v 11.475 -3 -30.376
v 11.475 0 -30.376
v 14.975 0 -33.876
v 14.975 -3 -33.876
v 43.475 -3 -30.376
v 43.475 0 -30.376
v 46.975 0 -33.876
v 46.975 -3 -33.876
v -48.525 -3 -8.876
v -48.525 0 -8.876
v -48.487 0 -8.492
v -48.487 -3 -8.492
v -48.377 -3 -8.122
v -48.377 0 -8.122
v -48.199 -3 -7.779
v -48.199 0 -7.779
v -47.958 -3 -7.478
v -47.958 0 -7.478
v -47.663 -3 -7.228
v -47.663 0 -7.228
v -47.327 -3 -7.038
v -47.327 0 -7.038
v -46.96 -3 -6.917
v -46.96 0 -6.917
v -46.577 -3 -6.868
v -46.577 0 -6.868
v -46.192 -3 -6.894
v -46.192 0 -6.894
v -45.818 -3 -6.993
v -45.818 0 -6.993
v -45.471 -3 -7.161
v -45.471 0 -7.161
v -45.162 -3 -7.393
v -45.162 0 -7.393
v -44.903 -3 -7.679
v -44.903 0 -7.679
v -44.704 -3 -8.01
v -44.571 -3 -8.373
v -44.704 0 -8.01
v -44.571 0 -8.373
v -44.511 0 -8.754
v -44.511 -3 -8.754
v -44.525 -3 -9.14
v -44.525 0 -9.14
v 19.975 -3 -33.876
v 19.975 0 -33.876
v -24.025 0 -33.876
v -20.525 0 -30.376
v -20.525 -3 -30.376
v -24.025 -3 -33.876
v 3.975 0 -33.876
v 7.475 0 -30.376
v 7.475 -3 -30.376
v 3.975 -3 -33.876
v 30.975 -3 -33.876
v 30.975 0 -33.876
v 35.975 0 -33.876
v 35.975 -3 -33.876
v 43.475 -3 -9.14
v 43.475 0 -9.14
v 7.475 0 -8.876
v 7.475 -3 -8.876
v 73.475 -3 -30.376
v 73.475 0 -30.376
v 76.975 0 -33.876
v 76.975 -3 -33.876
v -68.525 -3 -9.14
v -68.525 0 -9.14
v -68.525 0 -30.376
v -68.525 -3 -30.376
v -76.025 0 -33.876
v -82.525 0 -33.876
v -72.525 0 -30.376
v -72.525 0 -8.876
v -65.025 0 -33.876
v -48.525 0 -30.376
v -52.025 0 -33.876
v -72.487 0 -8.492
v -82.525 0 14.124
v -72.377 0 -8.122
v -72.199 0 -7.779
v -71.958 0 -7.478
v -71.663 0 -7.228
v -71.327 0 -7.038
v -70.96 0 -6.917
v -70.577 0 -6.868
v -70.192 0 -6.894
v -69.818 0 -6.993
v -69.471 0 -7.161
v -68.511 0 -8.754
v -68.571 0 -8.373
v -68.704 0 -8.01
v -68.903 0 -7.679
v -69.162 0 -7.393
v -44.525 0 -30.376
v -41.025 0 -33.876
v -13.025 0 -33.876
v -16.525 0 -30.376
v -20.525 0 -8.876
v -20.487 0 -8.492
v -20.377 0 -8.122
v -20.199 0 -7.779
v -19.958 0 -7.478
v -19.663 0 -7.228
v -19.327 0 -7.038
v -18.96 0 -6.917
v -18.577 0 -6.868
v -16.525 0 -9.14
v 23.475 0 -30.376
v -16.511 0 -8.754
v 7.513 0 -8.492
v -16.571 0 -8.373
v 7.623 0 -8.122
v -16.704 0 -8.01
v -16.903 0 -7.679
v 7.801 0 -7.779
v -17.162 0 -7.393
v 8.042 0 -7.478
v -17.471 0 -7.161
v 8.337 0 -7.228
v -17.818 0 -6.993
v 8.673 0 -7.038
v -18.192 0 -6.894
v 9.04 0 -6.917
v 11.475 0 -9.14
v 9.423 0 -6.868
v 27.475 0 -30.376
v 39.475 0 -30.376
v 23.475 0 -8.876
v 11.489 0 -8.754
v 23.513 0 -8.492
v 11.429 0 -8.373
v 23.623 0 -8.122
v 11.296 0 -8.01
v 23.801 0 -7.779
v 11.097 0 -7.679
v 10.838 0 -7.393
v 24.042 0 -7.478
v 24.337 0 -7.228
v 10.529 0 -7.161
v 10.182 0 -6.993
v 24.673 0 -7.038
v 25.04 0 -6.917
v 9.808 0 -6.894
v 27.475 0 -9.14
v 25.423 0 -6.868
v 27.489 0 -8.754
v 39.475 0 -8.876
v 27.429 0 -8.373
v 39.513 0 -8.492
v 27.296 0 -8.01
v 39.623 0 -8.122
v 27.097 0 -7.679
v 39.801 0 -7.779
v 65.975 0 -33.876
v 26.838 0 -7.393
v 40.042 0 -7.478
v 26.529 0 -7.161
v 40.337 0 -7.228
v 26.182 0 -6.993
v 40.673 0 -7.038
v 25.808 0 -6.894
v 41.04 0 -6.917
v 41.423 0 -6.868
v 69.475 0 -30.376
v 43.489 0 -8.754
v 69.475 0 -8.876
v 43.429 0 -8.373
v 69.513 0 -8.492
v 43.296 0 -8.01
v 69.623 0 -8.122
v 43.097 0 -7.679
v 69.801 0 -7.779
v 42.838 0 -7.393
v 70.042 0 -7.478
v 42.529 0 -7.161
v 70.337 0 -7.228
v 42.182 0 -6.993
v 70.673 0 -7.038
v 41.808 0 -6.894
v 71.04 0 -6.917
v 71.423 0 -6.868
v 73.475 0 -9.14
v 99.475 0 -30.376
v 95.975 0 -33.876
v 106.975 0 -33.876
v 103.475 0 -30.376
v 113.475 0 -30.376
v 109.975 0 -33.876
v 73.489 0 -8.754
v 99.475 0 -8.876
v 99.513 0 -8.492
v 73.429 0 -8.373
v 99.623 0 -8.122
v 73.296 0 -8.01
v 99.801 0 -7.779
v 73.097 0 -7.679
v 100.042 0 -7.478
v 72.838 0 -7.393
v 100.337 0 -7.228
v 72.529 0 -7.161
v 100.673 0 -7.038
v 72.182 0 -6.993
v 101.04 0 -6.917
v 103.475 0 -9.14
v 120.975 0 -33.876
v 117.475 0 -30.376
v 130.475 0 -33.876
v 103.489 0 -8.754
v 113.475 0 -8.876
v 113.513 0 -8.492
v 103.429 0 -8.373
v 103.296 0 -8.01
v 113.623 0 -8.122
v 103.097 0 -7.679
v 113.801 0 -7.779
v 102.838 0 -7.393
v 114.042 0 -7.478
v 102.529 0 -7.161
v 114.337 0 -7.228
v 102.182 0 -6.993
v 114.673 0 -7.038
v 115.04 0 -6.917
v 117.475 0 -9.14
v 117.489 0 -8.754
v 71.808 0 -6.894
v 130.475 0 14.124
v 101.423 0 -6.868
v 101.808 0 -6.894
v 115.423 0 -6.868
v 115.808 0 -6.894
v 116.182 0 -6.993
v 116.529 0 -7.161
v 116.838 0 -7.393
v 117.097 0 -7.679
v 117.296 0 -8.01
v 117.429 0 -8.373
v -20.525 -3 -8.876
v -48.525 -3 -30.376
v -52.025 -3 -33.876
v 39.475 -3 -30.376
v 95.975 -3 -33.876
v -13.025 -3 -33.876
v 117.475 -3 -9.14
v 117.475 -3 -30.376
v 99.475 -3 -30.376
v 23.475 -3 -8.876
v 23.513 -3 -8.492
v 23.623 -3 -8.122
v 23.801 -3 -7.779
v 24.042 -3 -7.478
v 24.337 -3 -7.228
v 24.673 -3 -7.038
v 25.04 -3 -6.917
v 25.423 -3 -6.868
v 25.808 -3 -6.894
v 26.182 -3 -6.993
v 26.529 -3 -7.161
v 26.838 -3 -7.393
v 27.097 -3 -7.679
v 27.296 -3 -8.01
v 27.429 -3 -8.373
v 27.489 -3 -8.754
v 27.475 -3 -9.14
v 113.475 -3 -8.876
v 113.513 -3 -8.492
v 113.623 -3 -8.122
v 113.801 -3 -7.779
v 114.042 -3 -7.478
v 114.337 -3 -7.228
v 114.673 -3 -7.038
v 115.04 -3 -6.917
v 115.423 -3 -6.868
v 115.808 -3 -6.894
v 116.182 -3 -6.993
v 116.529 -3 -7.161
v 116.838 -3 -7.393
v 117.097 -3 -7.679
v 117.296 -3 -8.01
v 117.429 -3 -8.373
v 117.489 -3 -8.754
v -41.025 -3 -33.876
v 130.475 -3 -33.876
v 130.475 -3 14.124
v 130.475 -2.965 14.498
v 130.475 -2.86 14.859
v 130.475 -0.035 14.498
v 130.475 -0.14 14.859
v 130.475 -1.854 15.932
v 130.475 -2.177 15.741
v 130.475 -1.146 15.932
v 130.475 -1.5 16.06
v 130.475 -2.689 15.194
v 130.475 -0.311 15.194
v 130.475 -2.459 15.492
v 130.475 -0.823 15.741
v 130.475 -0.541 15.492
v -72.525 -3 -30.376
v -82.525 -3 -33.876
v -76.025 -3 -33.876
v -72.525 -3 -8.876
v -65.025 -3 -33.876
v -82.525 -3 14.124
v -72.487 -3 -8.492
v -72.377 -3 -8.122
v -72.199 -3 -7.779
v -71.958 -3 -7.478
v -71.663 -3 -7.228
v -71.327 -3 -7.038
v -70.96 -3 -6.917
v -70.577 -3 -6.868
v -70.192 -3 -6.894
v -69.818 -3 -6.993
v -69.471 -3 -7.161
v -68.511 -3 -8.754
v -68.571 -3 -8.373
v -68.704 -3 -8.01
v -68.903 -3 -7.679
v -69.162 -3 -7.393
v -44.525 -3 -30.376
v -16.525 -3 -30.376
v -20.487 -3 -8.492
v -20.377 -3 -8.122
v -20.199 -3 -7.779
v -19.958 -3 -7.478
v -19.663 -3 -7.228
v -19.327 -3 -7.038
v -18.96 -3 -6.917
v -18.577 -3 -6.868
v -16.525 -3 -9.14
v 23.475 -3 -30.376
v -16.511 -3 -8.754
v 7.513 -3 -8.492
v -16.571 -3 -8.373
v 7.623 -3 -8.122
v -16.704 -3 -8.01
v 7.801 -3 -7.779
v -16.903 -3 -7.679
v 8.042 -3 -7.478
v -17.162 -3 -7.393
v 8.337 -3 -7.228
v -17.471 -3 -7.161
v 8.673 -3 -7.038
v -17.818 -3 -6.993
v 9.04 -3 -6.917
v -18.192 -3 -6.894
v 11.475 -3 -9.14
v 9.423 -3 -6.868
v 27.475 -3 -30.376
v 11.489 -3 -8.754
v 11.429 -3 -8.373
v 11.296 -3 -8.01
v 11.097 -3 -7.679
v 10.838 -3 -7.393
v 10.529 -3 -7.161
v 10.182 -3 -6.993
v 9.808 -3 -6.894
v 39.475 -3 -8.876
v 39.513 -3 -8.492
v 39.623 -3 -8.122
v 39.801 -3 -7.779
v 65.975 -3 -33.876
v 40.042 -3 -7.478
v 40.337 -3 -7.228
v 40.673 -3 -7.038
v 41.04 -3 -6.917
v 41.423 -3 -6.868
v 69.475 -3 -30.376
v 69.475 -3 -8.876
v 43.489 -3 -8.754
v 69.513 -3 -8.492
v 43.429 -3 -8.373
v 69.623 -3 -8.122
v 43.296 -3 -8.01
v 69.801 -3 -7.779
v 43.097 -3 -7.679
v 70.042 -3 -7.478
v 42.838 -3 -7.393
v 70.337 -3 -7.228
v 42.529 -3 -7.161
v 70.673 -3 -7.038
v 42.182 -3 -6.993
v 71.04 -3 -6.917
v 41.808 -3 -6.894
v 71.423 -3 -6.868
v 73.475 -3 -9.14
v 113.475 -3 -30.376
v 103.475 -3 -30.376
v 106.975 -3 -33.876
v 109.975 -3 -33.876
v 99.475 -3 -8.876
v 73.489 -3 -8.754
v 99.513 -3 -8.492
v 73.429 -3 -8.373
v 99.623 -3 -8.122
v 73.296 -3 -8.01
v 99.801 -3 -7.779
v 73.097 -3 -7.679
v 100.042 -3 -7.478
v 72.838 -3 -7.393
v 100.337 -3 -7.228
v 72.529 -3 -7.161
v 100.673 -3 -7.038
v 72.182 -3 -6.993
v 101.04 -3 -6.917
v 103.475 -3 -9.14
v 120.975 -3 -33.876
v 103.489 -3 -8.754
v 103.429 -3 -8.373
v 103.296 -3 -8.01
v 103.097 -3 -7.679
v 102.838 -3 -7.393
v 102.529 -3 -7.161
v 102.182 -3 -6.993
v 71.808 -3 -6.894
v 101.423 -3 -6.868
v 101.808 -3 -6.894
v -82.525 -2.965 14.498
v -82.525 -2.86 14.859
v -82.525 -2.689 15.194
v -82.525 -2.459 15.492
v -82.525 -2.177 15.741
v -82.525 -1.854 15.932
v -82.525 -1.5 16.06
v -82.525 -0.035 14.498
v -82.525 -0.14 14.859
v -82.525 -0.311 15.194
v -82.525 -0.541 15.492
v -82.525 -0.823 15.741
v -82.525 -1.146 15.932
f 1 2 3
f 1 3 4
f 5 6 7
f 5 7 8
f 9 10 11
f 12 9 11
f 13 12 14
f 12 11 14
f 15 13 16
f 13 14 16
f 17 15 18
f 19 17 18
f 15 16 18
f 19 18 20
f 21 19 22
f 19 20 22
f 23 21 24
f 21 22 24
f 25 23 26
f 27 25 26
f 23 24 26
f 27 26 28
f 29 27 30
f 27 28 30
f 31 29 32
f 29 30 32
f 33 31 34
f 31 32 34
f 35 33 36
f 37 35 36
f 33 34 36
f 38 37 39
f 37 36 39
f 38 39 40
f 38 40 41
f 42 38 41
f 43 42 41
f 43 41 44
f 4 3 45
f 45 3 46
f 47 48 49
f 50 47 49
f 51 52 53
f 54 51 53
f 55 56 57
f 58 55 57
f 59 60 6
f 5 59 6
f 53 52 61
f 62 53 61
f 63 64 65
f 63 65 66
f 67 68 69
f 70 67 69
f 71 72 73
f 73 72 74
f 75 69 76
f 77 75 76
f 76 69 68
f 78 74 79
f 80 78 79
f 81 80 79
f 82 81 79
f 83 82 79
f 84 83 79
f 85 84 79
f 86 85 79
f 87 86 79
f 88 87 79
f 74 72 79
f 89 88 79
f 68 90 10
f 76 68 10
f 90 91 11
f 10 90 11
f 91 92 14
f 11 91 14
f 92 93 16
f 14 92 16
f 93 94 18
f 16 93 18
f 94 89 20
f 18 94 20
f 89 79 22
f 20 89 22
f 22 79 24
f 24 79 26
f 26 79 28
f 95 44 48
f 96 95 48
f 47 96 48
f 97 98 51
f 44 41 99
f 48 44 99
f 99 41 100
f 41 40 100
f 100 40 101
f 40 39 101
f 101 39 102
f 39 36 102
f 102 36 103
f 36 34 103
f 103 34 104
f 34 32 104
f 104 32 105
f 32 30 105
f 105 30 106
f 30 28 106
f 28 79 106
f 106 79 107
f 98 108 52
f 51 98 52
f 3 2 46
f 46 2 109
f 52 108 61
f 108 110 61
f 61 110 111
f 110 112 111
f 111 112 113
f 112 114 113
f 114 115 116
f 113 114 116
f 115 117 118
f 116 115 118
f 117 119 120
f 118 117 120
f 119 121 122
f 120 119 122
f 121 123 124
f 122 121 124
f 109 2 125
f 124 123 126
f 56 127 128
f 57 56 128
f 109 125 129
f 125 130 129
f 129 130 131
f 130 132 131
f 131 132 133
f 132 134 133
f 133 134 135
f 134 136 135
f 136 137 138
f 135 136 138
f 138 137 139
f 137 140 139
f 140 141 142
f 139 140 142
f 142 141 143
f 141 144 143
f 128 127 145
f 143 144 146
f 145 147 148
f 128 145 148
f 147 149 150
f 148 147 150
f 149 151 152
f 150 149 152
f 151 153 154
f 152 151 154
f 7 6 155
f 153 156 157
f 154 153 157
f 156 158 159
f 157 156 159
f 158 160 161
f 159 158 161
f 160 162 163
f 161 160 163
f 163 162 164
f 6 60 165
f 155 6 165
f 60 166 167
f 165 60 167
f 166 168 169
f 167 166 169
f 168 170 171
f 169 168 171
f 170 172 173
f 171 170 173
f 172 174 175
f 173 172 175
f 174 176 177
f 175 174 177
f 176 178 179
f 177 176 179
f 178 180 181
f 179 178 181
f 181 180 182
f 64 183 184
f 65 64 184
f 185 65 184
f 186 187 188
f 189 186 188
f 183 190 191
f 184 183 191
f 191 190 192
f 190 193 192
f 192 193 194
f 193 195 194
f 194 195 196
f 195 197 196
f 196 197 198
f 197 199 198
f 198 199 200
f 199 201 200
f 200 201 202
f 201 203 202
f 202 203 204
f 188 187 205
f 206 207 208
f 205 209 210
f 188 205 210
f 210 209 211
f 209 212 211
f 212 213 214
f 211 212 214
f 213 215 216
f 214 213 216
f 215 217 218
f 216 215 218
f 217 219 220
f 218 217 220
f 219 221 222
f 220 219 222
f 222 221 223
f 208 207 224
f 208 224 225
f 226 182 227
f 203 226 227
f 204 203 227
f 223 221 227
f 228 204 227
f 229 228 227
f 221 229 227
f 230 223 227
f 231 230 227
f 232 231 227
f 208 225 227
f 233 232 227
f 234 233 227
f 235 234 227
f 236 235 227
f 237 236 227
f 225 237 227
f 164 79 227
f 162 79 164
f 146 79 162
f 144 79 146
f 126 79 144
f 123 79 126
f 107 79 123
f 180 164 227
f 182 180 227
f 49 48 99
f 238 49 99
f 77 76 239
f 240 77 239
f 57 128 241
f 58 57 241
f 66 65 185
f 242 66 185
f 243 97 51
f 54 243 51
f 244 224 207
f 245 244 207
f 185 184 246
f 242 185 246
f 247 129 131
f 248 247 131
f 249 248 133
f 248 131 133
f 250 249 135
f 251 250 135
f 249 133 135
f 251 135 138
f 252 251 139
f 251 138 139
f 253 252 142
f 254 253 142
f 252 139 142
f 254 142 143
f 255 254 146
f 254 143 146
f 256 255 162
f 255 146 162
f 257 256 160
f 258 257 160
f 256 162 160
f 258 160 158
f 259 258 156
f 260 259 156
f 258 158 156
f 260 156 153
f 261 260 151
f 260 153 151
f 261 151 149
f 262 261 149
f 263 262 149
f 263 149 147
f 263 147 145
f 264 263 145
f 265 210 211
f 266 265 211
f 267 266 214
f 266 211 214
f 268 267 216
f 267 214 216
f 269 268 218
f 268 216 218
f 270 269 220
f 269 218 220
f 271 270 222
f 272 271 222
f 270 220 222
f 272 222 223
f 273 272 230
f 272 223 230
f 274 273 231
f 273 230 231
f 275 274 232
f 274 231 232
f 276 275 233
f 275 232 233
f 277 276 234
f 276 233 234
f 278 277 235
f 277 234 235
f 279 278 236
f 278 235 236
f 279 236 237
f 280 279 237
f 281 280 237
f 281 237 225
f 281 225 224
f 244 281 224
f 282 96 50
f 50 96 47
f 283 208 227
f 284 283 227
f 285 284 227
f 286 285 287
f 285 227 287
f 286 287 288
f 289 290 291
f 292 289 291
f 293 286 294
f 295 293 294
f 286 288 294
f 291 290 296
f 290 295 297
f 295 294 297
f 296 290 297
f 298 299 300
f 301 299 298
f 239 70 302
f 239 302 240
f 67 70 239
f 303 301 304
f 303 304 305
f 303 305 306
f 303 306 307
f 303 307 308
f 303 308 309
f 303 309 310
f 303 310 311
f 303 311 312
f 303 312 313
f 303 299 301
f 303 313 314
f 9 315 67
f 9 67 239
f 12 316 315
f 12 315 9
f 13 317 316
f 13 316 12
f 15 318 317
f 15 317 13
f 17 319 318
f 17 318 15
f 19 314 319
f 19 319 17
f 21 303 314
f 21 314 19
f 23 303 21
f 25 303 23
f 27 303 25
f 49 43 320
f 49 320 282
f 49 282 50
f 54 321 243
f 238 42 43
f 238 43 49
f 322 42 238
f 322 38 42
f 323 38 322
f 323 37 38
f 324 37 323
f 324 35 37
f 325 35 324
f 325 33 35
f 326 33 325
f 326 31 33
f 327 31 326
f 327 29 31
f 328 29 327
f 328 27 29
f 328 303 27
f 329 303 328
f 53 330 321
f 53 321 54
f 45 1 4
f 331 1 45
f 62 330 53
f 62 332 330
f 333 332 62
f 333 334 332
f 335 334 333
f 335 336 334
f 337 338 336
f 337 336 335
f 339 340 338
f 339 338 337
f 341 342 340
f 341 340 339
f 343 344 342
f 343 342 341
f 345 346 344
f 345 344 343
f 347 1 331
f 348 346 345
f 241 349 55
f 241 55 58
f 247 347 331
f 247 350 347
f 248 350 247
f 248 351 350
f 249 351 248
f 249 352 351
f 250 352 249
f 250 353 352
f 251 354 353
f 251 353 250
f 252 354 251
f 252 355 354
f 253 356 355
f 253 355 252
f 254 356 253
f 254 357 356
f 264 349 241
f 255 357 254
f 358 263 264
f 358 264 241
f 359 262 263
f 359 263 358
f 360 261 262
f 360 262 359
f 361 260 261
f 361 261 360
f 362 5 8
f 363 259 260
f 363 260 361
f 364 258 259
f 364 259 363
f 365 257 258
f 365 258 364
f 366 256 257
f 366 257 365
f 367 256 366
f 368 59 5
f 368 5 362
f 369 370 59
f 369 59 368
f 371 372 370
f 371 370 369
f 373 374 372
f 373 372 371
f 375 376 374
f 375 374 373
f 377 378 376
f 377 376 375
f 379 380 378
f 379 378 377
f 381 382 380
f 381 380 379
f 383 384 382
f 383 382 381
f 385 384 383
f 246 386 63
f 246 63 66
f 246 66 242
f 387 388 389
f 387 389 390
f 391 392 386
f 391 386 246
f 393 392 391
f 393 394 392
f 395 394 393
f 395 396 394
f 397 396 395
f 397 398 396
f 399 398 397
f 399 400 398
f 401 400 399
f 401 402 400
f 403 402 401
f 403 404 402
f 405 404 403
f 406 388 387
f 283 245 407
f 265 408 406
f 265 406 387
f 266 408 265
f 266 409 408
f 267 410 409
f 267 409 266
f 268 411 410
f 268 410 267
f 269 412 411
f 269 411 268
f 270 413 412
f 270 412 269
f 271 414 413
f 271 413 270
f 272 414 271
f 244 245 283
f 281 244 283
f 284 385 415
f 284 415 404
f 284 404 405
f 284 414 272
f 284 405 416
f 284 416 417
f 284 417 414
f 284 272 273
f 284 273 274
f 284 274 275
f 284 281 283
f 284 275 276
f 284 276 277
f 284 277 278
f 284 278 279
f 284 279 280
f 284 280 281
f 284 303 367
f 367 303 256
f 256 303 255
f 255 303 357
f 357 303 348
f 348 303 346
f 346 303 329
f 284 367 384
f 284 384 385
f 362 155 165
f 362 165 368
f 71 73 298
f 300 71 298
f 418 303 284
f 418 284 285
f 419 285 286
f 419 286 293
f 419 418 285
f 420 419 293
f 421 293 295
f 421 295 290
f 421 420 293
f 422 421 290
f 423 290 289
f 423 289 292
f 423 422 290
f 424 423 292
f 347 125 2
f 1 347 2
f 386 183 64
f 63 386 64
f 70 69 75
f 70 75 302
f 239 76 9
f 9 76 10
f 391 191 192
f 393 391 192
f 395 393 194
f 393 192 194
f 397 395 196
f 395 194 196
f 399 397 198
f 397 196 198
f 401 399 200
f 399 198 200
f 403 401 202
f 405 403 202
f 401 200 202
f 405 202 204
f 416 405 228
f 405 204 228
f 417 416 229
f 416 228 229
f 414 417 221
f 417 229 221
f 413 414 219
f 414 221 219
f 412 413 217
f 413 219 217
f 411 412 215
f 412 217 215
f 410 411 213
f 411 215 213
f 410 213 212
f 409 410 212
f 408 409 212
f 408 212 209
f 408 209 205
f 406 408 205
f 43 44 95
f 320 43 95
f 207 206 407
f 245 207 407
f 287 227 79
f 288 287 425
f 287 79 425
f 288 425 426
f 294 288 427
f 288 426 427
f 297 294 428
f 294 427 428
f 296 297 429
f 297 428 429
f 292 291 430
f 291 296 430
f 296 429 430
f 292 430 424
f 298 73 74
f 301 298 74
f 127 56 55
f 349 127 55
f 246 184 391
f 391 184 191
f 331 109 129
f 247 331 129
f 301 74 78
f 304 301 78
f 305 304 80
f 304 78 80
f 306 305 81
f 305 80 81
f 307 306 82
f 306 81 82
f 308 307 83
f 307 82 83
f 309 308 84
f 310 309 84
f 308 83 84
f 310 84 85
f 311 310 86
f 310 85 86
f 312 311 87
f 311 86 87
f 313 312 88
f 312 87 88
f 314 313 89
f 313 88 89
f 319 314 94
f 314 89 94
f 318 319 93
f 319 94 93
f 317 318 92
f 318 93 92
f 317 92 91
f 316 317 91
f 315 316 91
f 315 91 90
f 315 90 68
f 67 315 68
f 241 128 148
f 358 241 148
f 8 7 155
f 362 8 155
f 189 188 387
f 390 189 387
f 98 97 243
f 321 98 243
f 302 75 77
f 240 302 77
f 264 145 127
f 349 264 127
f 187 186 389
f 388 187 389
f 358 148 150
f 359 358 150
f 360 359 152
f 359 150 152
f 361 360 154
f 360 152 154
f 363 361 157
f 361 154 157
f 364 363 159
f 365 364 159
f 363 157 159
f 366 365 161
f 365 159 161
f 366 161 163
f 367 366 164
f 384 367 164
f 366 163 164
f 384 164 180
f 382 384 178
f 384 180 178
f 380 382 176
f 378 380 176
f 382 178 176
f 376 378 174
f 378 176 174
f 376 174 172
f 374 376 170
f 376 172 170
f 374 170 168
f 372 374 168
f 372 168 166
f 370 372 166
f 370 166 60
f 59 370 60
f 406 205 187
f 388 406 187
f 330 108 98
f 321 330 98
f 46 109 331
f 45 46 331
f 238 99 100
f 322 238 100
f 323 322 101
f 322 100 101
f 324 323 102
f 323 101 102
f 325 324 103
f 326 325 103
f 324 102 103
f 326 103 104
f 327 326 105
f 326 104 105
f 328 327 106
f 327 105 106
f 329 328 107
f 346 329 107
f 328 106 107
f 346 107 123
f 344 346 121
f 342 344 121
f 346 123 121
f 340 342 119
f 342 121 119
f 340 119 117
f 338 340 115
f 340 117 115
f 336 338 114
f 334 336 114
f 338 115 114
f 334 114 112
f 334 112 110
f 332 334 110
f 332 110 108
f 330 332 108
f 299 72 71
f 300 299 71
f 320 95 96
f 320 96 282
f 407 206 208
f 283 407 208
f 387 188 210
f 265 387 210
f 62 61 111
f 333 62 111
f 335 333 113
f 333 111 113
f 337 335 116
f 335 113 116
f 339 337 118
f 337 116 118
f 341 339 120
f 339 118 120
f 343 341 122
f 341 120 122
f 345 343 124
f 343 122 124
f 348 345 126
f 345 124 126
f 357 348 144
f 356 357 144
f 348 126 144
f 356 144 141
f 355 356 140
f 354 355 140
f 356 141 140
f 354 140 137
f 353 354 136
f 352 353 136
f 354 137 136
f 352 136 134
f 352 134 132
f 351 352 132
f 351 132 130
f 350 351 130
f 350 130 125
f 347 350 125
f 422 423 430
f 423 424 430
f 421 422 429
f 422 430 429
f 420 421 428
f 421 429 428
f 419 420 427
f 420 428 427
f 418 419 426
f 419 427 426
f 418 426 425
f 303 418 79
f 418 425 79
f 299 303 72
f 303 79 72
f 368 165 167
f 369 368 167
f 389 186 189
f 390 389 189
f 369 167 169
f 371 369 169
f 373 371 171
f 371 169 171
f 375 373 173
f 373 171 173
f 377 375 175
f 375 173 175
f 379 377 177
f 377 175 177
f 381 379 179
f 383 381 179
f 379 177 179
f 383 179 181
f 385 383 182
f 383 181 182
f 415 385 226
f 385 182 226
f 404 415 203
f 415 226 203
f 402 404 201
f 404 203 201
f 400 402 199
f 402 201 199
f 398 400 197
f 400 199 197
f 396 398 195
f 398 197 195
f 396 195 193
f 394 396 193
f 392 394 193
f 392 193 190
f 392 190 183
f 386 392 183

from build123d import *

# Parameters (mm, degrees)
F1_DEPTH    = 3
F2_SIZE     = 3.5
F3_T1_DEPTH = 223


# Not quite as in the source:
# - a fillet or chamfer that OpenCascade refuses, or shapes differently, is made with other operations: its cross-section is extruded or revolved along the edge and cut away or added


with BuildPart() as f1:
    # F0 (on Front) → F1 (new body)
    with BuildSketch(Plane.XZ):
        with BuildLine():
            Line((130.4753928185, 16.1237554376), (-82.5246071815, 16.1237554376))
            Line((-82.5246071815, 16.1237554376), (-82.5246071815, -33.8762445624))
            Line((-82.5246071815, -33.8762445624), (-72.5246071815, -33.8762445624))
            Line((-72.5246071815, -33.8762445624), (-72.5246071815, -8.8762445624))
            ThreePointArc((-72.5246071815, -8.8762445624), (-70.3837107757, -6.871899239), (-68.5246071815, -9.1400640085))
            Line((-68.5246071815, -9.1400640085), (-68.5246071815, -33.8762445624))
            Line((-68.5246071815, -33.8762445624), (-48.5246071815, -33.8762445624))
            Line((-48.5246071815, -33.8762445624), (-48.5246071815, -8.8762445624))
            ThreePointArc((-48.5246071815, -8.8762445624), (-46.3837107899, -6.8718992399), (-44.5246071815, -9.1400639837))
            Line((-44.5246071815, -9.1400639837), (-44.5246071815, -33.8762445624))
            Line((-44.5246071815, -33.8762445624), (-20.5246071815, -33.8762445624))
            Line((-20.5246071815, -33.8762445624), (-20.5246071815, -8.8762445624))
            ThreePointArc((-20.5246071815, -8.8762445624), (-18.3837111079, -6.8718992583), (-16.5246071815, -9.1400634249))
            Line((-16.5246071815, -9.1400634249), (-16.5246071815, -33.8762445624))
            Line((-16.5246071815, -33.8762445624), (7.4753928185, -33.8762445624))
            Line((7.4753928185, -33.8762445624), (7.4753928185, -8.8762445624))
            ThreePointArc((7.4753928185, -8.8762445624), (9.6162888921, -6.8718992583), (11.4753928185, -9.1400634249))
            Line((11.4753928185, -9.1400634249), (11.4753928185, -33.8762445624))
            Line((11.4753928185, -33.8762445624), (23.4753928185, -33.8762445624))
            Line((23.4753928185, -33.8762445624), (23.4753928185, -8.8762445624))
            ThreePointArc((23.4753928185, -8.8762445624), (25.6162892101, -6.8718992399), (27.4753928185, -9.1400639837))
            Line((27.4753928185, -9.1400639837), (27.4753928185, -33.8762445624))
            Line((27.4753928185, -33.8762445624), (39.4753928185, -33.8762445624))
            Line((39.4753928185, -33.8762445624), (39.4753928185, -8.8762445624))
            ThreePointArc((39.4753928185, -8.8762445624), (41.6162892243, -6.871899239), (43.4753928185, -9.1400640085))
            Line((43.4753928185, -9.1400640085), (43.4753928185, -33.8762445624))
            Line((43.4753928185, -33.8762445624), (69.4753928185, -33.8762445624))
            Line((69.4753928185, -33.8762445624), (69.4753928185, -8.8762445624))
            ThreePointArc((69.4753928185, -8.8762445624), (71.6162892243, -6.871899239), (73.4753928185, -9.1400640085))
            Line((73.4753928185, -9.1400640085), (73.4753928185, -33.8762445624))
            Line((73.4753928185, -33.8762445624), (99.4753928185, -33.8762445624))
            Line((99.4753928185, -33.8762445624), (99.4753928185, -8.8762445624))
            ThreePointArc((99.4753928185, -8.8762445624), (101.6162892243, -6.871899239), (103.4753928185, -9.1400640085))
            Line((103.4753928185, -9.1400640085), (103.4753928185, -33.8762445624))
            Line((103.4753928185, -33.8762445624), (113.4753928185, -33.8762445624))
            Line((113.4753928185, -33.8762445624), (113.4753928185, -8.8762445624))
            ThreePointArc((113.4753928185, -8.8762445624), (115.6162892243, -6.871899239), (117.4753928185, -9.1400640085))
            Line((117.4753928185, -9.1400640085), (117.4753928185, -33.8762445624))
            Line((117.4753928185, -33.8762445624), (130.4753928185, -33.8762445624))
            Line((130.4753928185, -33.8762445624), (130.4753928185, 16.1237554376))
        make_face()
    extrude(amount=F1_DEPTH)

    # F2
    f2_edges = [f1.edges().sort_by_distance(p)[0] for p in [
        (-72.524607, -1.5, -33.876245),
        (-48.524607, -1.5, -33.876245),
        (-20.524607, -1.5, -33.876245),
        (7.475393, -1.5, -33.876245),
        (23.475393, -1.5, -33.876245),
        (39.475393, -1.5, -33.876245),
        (69.475393, -1.5, -33.876245),
        (99.475393, -1.5, -33.876245),
        (113.475393, -1.5, -33.876245),
        (103.475393, -1.5, -33.876245),
        (117.475393, -1.5, -33.876245),
        (73.475393, -1.5, -33.876245),
        (43.475393, -1.5, -33.876245),
        (27.475393, -1.5, -33.876245),
        (11.475393, -1.5, -33.876245),
        (-16.524607, -1.5, -33.876245),
        (-44.524607, -1.5, -33.876245),
        (-68.524607, -1.5, -33.876245),
    ]]
    chamfer(f2_edges, length=F2_SIZE)

    # F3: fillet of radius 2 on 2 edges, made by hand

    # F3_s2 → F3_t1 (cut)
    with BuildSketch(Plane.YZ.offset(-87.5246071815)):
        with BuildLine():
            ThreePointArc((-3, 14.1237554376), (-2.4142135624, 15.537969), (-1, 16.1237554376))
            Line((-1, 16.1237554376), (-3, 16.1237554376))
            Line((-3, 16.1237554376), (-3, 14.1237554376))
        make_face()
        with BuildLine():
            ThreePointArc((0, 14.1237554376), (-0.5857864376, 15.537969), (-2, 16.1237554376))
            Line((-2, 16.1237554376), (0, 16.1237554376))
            Line((0, 16.1237554376), (0, 14.1237554376))
        make_face()
    extrude(amount=F3_T1_DEPTH, mode=Mode.SUBTRACT)


solid = f1.part
